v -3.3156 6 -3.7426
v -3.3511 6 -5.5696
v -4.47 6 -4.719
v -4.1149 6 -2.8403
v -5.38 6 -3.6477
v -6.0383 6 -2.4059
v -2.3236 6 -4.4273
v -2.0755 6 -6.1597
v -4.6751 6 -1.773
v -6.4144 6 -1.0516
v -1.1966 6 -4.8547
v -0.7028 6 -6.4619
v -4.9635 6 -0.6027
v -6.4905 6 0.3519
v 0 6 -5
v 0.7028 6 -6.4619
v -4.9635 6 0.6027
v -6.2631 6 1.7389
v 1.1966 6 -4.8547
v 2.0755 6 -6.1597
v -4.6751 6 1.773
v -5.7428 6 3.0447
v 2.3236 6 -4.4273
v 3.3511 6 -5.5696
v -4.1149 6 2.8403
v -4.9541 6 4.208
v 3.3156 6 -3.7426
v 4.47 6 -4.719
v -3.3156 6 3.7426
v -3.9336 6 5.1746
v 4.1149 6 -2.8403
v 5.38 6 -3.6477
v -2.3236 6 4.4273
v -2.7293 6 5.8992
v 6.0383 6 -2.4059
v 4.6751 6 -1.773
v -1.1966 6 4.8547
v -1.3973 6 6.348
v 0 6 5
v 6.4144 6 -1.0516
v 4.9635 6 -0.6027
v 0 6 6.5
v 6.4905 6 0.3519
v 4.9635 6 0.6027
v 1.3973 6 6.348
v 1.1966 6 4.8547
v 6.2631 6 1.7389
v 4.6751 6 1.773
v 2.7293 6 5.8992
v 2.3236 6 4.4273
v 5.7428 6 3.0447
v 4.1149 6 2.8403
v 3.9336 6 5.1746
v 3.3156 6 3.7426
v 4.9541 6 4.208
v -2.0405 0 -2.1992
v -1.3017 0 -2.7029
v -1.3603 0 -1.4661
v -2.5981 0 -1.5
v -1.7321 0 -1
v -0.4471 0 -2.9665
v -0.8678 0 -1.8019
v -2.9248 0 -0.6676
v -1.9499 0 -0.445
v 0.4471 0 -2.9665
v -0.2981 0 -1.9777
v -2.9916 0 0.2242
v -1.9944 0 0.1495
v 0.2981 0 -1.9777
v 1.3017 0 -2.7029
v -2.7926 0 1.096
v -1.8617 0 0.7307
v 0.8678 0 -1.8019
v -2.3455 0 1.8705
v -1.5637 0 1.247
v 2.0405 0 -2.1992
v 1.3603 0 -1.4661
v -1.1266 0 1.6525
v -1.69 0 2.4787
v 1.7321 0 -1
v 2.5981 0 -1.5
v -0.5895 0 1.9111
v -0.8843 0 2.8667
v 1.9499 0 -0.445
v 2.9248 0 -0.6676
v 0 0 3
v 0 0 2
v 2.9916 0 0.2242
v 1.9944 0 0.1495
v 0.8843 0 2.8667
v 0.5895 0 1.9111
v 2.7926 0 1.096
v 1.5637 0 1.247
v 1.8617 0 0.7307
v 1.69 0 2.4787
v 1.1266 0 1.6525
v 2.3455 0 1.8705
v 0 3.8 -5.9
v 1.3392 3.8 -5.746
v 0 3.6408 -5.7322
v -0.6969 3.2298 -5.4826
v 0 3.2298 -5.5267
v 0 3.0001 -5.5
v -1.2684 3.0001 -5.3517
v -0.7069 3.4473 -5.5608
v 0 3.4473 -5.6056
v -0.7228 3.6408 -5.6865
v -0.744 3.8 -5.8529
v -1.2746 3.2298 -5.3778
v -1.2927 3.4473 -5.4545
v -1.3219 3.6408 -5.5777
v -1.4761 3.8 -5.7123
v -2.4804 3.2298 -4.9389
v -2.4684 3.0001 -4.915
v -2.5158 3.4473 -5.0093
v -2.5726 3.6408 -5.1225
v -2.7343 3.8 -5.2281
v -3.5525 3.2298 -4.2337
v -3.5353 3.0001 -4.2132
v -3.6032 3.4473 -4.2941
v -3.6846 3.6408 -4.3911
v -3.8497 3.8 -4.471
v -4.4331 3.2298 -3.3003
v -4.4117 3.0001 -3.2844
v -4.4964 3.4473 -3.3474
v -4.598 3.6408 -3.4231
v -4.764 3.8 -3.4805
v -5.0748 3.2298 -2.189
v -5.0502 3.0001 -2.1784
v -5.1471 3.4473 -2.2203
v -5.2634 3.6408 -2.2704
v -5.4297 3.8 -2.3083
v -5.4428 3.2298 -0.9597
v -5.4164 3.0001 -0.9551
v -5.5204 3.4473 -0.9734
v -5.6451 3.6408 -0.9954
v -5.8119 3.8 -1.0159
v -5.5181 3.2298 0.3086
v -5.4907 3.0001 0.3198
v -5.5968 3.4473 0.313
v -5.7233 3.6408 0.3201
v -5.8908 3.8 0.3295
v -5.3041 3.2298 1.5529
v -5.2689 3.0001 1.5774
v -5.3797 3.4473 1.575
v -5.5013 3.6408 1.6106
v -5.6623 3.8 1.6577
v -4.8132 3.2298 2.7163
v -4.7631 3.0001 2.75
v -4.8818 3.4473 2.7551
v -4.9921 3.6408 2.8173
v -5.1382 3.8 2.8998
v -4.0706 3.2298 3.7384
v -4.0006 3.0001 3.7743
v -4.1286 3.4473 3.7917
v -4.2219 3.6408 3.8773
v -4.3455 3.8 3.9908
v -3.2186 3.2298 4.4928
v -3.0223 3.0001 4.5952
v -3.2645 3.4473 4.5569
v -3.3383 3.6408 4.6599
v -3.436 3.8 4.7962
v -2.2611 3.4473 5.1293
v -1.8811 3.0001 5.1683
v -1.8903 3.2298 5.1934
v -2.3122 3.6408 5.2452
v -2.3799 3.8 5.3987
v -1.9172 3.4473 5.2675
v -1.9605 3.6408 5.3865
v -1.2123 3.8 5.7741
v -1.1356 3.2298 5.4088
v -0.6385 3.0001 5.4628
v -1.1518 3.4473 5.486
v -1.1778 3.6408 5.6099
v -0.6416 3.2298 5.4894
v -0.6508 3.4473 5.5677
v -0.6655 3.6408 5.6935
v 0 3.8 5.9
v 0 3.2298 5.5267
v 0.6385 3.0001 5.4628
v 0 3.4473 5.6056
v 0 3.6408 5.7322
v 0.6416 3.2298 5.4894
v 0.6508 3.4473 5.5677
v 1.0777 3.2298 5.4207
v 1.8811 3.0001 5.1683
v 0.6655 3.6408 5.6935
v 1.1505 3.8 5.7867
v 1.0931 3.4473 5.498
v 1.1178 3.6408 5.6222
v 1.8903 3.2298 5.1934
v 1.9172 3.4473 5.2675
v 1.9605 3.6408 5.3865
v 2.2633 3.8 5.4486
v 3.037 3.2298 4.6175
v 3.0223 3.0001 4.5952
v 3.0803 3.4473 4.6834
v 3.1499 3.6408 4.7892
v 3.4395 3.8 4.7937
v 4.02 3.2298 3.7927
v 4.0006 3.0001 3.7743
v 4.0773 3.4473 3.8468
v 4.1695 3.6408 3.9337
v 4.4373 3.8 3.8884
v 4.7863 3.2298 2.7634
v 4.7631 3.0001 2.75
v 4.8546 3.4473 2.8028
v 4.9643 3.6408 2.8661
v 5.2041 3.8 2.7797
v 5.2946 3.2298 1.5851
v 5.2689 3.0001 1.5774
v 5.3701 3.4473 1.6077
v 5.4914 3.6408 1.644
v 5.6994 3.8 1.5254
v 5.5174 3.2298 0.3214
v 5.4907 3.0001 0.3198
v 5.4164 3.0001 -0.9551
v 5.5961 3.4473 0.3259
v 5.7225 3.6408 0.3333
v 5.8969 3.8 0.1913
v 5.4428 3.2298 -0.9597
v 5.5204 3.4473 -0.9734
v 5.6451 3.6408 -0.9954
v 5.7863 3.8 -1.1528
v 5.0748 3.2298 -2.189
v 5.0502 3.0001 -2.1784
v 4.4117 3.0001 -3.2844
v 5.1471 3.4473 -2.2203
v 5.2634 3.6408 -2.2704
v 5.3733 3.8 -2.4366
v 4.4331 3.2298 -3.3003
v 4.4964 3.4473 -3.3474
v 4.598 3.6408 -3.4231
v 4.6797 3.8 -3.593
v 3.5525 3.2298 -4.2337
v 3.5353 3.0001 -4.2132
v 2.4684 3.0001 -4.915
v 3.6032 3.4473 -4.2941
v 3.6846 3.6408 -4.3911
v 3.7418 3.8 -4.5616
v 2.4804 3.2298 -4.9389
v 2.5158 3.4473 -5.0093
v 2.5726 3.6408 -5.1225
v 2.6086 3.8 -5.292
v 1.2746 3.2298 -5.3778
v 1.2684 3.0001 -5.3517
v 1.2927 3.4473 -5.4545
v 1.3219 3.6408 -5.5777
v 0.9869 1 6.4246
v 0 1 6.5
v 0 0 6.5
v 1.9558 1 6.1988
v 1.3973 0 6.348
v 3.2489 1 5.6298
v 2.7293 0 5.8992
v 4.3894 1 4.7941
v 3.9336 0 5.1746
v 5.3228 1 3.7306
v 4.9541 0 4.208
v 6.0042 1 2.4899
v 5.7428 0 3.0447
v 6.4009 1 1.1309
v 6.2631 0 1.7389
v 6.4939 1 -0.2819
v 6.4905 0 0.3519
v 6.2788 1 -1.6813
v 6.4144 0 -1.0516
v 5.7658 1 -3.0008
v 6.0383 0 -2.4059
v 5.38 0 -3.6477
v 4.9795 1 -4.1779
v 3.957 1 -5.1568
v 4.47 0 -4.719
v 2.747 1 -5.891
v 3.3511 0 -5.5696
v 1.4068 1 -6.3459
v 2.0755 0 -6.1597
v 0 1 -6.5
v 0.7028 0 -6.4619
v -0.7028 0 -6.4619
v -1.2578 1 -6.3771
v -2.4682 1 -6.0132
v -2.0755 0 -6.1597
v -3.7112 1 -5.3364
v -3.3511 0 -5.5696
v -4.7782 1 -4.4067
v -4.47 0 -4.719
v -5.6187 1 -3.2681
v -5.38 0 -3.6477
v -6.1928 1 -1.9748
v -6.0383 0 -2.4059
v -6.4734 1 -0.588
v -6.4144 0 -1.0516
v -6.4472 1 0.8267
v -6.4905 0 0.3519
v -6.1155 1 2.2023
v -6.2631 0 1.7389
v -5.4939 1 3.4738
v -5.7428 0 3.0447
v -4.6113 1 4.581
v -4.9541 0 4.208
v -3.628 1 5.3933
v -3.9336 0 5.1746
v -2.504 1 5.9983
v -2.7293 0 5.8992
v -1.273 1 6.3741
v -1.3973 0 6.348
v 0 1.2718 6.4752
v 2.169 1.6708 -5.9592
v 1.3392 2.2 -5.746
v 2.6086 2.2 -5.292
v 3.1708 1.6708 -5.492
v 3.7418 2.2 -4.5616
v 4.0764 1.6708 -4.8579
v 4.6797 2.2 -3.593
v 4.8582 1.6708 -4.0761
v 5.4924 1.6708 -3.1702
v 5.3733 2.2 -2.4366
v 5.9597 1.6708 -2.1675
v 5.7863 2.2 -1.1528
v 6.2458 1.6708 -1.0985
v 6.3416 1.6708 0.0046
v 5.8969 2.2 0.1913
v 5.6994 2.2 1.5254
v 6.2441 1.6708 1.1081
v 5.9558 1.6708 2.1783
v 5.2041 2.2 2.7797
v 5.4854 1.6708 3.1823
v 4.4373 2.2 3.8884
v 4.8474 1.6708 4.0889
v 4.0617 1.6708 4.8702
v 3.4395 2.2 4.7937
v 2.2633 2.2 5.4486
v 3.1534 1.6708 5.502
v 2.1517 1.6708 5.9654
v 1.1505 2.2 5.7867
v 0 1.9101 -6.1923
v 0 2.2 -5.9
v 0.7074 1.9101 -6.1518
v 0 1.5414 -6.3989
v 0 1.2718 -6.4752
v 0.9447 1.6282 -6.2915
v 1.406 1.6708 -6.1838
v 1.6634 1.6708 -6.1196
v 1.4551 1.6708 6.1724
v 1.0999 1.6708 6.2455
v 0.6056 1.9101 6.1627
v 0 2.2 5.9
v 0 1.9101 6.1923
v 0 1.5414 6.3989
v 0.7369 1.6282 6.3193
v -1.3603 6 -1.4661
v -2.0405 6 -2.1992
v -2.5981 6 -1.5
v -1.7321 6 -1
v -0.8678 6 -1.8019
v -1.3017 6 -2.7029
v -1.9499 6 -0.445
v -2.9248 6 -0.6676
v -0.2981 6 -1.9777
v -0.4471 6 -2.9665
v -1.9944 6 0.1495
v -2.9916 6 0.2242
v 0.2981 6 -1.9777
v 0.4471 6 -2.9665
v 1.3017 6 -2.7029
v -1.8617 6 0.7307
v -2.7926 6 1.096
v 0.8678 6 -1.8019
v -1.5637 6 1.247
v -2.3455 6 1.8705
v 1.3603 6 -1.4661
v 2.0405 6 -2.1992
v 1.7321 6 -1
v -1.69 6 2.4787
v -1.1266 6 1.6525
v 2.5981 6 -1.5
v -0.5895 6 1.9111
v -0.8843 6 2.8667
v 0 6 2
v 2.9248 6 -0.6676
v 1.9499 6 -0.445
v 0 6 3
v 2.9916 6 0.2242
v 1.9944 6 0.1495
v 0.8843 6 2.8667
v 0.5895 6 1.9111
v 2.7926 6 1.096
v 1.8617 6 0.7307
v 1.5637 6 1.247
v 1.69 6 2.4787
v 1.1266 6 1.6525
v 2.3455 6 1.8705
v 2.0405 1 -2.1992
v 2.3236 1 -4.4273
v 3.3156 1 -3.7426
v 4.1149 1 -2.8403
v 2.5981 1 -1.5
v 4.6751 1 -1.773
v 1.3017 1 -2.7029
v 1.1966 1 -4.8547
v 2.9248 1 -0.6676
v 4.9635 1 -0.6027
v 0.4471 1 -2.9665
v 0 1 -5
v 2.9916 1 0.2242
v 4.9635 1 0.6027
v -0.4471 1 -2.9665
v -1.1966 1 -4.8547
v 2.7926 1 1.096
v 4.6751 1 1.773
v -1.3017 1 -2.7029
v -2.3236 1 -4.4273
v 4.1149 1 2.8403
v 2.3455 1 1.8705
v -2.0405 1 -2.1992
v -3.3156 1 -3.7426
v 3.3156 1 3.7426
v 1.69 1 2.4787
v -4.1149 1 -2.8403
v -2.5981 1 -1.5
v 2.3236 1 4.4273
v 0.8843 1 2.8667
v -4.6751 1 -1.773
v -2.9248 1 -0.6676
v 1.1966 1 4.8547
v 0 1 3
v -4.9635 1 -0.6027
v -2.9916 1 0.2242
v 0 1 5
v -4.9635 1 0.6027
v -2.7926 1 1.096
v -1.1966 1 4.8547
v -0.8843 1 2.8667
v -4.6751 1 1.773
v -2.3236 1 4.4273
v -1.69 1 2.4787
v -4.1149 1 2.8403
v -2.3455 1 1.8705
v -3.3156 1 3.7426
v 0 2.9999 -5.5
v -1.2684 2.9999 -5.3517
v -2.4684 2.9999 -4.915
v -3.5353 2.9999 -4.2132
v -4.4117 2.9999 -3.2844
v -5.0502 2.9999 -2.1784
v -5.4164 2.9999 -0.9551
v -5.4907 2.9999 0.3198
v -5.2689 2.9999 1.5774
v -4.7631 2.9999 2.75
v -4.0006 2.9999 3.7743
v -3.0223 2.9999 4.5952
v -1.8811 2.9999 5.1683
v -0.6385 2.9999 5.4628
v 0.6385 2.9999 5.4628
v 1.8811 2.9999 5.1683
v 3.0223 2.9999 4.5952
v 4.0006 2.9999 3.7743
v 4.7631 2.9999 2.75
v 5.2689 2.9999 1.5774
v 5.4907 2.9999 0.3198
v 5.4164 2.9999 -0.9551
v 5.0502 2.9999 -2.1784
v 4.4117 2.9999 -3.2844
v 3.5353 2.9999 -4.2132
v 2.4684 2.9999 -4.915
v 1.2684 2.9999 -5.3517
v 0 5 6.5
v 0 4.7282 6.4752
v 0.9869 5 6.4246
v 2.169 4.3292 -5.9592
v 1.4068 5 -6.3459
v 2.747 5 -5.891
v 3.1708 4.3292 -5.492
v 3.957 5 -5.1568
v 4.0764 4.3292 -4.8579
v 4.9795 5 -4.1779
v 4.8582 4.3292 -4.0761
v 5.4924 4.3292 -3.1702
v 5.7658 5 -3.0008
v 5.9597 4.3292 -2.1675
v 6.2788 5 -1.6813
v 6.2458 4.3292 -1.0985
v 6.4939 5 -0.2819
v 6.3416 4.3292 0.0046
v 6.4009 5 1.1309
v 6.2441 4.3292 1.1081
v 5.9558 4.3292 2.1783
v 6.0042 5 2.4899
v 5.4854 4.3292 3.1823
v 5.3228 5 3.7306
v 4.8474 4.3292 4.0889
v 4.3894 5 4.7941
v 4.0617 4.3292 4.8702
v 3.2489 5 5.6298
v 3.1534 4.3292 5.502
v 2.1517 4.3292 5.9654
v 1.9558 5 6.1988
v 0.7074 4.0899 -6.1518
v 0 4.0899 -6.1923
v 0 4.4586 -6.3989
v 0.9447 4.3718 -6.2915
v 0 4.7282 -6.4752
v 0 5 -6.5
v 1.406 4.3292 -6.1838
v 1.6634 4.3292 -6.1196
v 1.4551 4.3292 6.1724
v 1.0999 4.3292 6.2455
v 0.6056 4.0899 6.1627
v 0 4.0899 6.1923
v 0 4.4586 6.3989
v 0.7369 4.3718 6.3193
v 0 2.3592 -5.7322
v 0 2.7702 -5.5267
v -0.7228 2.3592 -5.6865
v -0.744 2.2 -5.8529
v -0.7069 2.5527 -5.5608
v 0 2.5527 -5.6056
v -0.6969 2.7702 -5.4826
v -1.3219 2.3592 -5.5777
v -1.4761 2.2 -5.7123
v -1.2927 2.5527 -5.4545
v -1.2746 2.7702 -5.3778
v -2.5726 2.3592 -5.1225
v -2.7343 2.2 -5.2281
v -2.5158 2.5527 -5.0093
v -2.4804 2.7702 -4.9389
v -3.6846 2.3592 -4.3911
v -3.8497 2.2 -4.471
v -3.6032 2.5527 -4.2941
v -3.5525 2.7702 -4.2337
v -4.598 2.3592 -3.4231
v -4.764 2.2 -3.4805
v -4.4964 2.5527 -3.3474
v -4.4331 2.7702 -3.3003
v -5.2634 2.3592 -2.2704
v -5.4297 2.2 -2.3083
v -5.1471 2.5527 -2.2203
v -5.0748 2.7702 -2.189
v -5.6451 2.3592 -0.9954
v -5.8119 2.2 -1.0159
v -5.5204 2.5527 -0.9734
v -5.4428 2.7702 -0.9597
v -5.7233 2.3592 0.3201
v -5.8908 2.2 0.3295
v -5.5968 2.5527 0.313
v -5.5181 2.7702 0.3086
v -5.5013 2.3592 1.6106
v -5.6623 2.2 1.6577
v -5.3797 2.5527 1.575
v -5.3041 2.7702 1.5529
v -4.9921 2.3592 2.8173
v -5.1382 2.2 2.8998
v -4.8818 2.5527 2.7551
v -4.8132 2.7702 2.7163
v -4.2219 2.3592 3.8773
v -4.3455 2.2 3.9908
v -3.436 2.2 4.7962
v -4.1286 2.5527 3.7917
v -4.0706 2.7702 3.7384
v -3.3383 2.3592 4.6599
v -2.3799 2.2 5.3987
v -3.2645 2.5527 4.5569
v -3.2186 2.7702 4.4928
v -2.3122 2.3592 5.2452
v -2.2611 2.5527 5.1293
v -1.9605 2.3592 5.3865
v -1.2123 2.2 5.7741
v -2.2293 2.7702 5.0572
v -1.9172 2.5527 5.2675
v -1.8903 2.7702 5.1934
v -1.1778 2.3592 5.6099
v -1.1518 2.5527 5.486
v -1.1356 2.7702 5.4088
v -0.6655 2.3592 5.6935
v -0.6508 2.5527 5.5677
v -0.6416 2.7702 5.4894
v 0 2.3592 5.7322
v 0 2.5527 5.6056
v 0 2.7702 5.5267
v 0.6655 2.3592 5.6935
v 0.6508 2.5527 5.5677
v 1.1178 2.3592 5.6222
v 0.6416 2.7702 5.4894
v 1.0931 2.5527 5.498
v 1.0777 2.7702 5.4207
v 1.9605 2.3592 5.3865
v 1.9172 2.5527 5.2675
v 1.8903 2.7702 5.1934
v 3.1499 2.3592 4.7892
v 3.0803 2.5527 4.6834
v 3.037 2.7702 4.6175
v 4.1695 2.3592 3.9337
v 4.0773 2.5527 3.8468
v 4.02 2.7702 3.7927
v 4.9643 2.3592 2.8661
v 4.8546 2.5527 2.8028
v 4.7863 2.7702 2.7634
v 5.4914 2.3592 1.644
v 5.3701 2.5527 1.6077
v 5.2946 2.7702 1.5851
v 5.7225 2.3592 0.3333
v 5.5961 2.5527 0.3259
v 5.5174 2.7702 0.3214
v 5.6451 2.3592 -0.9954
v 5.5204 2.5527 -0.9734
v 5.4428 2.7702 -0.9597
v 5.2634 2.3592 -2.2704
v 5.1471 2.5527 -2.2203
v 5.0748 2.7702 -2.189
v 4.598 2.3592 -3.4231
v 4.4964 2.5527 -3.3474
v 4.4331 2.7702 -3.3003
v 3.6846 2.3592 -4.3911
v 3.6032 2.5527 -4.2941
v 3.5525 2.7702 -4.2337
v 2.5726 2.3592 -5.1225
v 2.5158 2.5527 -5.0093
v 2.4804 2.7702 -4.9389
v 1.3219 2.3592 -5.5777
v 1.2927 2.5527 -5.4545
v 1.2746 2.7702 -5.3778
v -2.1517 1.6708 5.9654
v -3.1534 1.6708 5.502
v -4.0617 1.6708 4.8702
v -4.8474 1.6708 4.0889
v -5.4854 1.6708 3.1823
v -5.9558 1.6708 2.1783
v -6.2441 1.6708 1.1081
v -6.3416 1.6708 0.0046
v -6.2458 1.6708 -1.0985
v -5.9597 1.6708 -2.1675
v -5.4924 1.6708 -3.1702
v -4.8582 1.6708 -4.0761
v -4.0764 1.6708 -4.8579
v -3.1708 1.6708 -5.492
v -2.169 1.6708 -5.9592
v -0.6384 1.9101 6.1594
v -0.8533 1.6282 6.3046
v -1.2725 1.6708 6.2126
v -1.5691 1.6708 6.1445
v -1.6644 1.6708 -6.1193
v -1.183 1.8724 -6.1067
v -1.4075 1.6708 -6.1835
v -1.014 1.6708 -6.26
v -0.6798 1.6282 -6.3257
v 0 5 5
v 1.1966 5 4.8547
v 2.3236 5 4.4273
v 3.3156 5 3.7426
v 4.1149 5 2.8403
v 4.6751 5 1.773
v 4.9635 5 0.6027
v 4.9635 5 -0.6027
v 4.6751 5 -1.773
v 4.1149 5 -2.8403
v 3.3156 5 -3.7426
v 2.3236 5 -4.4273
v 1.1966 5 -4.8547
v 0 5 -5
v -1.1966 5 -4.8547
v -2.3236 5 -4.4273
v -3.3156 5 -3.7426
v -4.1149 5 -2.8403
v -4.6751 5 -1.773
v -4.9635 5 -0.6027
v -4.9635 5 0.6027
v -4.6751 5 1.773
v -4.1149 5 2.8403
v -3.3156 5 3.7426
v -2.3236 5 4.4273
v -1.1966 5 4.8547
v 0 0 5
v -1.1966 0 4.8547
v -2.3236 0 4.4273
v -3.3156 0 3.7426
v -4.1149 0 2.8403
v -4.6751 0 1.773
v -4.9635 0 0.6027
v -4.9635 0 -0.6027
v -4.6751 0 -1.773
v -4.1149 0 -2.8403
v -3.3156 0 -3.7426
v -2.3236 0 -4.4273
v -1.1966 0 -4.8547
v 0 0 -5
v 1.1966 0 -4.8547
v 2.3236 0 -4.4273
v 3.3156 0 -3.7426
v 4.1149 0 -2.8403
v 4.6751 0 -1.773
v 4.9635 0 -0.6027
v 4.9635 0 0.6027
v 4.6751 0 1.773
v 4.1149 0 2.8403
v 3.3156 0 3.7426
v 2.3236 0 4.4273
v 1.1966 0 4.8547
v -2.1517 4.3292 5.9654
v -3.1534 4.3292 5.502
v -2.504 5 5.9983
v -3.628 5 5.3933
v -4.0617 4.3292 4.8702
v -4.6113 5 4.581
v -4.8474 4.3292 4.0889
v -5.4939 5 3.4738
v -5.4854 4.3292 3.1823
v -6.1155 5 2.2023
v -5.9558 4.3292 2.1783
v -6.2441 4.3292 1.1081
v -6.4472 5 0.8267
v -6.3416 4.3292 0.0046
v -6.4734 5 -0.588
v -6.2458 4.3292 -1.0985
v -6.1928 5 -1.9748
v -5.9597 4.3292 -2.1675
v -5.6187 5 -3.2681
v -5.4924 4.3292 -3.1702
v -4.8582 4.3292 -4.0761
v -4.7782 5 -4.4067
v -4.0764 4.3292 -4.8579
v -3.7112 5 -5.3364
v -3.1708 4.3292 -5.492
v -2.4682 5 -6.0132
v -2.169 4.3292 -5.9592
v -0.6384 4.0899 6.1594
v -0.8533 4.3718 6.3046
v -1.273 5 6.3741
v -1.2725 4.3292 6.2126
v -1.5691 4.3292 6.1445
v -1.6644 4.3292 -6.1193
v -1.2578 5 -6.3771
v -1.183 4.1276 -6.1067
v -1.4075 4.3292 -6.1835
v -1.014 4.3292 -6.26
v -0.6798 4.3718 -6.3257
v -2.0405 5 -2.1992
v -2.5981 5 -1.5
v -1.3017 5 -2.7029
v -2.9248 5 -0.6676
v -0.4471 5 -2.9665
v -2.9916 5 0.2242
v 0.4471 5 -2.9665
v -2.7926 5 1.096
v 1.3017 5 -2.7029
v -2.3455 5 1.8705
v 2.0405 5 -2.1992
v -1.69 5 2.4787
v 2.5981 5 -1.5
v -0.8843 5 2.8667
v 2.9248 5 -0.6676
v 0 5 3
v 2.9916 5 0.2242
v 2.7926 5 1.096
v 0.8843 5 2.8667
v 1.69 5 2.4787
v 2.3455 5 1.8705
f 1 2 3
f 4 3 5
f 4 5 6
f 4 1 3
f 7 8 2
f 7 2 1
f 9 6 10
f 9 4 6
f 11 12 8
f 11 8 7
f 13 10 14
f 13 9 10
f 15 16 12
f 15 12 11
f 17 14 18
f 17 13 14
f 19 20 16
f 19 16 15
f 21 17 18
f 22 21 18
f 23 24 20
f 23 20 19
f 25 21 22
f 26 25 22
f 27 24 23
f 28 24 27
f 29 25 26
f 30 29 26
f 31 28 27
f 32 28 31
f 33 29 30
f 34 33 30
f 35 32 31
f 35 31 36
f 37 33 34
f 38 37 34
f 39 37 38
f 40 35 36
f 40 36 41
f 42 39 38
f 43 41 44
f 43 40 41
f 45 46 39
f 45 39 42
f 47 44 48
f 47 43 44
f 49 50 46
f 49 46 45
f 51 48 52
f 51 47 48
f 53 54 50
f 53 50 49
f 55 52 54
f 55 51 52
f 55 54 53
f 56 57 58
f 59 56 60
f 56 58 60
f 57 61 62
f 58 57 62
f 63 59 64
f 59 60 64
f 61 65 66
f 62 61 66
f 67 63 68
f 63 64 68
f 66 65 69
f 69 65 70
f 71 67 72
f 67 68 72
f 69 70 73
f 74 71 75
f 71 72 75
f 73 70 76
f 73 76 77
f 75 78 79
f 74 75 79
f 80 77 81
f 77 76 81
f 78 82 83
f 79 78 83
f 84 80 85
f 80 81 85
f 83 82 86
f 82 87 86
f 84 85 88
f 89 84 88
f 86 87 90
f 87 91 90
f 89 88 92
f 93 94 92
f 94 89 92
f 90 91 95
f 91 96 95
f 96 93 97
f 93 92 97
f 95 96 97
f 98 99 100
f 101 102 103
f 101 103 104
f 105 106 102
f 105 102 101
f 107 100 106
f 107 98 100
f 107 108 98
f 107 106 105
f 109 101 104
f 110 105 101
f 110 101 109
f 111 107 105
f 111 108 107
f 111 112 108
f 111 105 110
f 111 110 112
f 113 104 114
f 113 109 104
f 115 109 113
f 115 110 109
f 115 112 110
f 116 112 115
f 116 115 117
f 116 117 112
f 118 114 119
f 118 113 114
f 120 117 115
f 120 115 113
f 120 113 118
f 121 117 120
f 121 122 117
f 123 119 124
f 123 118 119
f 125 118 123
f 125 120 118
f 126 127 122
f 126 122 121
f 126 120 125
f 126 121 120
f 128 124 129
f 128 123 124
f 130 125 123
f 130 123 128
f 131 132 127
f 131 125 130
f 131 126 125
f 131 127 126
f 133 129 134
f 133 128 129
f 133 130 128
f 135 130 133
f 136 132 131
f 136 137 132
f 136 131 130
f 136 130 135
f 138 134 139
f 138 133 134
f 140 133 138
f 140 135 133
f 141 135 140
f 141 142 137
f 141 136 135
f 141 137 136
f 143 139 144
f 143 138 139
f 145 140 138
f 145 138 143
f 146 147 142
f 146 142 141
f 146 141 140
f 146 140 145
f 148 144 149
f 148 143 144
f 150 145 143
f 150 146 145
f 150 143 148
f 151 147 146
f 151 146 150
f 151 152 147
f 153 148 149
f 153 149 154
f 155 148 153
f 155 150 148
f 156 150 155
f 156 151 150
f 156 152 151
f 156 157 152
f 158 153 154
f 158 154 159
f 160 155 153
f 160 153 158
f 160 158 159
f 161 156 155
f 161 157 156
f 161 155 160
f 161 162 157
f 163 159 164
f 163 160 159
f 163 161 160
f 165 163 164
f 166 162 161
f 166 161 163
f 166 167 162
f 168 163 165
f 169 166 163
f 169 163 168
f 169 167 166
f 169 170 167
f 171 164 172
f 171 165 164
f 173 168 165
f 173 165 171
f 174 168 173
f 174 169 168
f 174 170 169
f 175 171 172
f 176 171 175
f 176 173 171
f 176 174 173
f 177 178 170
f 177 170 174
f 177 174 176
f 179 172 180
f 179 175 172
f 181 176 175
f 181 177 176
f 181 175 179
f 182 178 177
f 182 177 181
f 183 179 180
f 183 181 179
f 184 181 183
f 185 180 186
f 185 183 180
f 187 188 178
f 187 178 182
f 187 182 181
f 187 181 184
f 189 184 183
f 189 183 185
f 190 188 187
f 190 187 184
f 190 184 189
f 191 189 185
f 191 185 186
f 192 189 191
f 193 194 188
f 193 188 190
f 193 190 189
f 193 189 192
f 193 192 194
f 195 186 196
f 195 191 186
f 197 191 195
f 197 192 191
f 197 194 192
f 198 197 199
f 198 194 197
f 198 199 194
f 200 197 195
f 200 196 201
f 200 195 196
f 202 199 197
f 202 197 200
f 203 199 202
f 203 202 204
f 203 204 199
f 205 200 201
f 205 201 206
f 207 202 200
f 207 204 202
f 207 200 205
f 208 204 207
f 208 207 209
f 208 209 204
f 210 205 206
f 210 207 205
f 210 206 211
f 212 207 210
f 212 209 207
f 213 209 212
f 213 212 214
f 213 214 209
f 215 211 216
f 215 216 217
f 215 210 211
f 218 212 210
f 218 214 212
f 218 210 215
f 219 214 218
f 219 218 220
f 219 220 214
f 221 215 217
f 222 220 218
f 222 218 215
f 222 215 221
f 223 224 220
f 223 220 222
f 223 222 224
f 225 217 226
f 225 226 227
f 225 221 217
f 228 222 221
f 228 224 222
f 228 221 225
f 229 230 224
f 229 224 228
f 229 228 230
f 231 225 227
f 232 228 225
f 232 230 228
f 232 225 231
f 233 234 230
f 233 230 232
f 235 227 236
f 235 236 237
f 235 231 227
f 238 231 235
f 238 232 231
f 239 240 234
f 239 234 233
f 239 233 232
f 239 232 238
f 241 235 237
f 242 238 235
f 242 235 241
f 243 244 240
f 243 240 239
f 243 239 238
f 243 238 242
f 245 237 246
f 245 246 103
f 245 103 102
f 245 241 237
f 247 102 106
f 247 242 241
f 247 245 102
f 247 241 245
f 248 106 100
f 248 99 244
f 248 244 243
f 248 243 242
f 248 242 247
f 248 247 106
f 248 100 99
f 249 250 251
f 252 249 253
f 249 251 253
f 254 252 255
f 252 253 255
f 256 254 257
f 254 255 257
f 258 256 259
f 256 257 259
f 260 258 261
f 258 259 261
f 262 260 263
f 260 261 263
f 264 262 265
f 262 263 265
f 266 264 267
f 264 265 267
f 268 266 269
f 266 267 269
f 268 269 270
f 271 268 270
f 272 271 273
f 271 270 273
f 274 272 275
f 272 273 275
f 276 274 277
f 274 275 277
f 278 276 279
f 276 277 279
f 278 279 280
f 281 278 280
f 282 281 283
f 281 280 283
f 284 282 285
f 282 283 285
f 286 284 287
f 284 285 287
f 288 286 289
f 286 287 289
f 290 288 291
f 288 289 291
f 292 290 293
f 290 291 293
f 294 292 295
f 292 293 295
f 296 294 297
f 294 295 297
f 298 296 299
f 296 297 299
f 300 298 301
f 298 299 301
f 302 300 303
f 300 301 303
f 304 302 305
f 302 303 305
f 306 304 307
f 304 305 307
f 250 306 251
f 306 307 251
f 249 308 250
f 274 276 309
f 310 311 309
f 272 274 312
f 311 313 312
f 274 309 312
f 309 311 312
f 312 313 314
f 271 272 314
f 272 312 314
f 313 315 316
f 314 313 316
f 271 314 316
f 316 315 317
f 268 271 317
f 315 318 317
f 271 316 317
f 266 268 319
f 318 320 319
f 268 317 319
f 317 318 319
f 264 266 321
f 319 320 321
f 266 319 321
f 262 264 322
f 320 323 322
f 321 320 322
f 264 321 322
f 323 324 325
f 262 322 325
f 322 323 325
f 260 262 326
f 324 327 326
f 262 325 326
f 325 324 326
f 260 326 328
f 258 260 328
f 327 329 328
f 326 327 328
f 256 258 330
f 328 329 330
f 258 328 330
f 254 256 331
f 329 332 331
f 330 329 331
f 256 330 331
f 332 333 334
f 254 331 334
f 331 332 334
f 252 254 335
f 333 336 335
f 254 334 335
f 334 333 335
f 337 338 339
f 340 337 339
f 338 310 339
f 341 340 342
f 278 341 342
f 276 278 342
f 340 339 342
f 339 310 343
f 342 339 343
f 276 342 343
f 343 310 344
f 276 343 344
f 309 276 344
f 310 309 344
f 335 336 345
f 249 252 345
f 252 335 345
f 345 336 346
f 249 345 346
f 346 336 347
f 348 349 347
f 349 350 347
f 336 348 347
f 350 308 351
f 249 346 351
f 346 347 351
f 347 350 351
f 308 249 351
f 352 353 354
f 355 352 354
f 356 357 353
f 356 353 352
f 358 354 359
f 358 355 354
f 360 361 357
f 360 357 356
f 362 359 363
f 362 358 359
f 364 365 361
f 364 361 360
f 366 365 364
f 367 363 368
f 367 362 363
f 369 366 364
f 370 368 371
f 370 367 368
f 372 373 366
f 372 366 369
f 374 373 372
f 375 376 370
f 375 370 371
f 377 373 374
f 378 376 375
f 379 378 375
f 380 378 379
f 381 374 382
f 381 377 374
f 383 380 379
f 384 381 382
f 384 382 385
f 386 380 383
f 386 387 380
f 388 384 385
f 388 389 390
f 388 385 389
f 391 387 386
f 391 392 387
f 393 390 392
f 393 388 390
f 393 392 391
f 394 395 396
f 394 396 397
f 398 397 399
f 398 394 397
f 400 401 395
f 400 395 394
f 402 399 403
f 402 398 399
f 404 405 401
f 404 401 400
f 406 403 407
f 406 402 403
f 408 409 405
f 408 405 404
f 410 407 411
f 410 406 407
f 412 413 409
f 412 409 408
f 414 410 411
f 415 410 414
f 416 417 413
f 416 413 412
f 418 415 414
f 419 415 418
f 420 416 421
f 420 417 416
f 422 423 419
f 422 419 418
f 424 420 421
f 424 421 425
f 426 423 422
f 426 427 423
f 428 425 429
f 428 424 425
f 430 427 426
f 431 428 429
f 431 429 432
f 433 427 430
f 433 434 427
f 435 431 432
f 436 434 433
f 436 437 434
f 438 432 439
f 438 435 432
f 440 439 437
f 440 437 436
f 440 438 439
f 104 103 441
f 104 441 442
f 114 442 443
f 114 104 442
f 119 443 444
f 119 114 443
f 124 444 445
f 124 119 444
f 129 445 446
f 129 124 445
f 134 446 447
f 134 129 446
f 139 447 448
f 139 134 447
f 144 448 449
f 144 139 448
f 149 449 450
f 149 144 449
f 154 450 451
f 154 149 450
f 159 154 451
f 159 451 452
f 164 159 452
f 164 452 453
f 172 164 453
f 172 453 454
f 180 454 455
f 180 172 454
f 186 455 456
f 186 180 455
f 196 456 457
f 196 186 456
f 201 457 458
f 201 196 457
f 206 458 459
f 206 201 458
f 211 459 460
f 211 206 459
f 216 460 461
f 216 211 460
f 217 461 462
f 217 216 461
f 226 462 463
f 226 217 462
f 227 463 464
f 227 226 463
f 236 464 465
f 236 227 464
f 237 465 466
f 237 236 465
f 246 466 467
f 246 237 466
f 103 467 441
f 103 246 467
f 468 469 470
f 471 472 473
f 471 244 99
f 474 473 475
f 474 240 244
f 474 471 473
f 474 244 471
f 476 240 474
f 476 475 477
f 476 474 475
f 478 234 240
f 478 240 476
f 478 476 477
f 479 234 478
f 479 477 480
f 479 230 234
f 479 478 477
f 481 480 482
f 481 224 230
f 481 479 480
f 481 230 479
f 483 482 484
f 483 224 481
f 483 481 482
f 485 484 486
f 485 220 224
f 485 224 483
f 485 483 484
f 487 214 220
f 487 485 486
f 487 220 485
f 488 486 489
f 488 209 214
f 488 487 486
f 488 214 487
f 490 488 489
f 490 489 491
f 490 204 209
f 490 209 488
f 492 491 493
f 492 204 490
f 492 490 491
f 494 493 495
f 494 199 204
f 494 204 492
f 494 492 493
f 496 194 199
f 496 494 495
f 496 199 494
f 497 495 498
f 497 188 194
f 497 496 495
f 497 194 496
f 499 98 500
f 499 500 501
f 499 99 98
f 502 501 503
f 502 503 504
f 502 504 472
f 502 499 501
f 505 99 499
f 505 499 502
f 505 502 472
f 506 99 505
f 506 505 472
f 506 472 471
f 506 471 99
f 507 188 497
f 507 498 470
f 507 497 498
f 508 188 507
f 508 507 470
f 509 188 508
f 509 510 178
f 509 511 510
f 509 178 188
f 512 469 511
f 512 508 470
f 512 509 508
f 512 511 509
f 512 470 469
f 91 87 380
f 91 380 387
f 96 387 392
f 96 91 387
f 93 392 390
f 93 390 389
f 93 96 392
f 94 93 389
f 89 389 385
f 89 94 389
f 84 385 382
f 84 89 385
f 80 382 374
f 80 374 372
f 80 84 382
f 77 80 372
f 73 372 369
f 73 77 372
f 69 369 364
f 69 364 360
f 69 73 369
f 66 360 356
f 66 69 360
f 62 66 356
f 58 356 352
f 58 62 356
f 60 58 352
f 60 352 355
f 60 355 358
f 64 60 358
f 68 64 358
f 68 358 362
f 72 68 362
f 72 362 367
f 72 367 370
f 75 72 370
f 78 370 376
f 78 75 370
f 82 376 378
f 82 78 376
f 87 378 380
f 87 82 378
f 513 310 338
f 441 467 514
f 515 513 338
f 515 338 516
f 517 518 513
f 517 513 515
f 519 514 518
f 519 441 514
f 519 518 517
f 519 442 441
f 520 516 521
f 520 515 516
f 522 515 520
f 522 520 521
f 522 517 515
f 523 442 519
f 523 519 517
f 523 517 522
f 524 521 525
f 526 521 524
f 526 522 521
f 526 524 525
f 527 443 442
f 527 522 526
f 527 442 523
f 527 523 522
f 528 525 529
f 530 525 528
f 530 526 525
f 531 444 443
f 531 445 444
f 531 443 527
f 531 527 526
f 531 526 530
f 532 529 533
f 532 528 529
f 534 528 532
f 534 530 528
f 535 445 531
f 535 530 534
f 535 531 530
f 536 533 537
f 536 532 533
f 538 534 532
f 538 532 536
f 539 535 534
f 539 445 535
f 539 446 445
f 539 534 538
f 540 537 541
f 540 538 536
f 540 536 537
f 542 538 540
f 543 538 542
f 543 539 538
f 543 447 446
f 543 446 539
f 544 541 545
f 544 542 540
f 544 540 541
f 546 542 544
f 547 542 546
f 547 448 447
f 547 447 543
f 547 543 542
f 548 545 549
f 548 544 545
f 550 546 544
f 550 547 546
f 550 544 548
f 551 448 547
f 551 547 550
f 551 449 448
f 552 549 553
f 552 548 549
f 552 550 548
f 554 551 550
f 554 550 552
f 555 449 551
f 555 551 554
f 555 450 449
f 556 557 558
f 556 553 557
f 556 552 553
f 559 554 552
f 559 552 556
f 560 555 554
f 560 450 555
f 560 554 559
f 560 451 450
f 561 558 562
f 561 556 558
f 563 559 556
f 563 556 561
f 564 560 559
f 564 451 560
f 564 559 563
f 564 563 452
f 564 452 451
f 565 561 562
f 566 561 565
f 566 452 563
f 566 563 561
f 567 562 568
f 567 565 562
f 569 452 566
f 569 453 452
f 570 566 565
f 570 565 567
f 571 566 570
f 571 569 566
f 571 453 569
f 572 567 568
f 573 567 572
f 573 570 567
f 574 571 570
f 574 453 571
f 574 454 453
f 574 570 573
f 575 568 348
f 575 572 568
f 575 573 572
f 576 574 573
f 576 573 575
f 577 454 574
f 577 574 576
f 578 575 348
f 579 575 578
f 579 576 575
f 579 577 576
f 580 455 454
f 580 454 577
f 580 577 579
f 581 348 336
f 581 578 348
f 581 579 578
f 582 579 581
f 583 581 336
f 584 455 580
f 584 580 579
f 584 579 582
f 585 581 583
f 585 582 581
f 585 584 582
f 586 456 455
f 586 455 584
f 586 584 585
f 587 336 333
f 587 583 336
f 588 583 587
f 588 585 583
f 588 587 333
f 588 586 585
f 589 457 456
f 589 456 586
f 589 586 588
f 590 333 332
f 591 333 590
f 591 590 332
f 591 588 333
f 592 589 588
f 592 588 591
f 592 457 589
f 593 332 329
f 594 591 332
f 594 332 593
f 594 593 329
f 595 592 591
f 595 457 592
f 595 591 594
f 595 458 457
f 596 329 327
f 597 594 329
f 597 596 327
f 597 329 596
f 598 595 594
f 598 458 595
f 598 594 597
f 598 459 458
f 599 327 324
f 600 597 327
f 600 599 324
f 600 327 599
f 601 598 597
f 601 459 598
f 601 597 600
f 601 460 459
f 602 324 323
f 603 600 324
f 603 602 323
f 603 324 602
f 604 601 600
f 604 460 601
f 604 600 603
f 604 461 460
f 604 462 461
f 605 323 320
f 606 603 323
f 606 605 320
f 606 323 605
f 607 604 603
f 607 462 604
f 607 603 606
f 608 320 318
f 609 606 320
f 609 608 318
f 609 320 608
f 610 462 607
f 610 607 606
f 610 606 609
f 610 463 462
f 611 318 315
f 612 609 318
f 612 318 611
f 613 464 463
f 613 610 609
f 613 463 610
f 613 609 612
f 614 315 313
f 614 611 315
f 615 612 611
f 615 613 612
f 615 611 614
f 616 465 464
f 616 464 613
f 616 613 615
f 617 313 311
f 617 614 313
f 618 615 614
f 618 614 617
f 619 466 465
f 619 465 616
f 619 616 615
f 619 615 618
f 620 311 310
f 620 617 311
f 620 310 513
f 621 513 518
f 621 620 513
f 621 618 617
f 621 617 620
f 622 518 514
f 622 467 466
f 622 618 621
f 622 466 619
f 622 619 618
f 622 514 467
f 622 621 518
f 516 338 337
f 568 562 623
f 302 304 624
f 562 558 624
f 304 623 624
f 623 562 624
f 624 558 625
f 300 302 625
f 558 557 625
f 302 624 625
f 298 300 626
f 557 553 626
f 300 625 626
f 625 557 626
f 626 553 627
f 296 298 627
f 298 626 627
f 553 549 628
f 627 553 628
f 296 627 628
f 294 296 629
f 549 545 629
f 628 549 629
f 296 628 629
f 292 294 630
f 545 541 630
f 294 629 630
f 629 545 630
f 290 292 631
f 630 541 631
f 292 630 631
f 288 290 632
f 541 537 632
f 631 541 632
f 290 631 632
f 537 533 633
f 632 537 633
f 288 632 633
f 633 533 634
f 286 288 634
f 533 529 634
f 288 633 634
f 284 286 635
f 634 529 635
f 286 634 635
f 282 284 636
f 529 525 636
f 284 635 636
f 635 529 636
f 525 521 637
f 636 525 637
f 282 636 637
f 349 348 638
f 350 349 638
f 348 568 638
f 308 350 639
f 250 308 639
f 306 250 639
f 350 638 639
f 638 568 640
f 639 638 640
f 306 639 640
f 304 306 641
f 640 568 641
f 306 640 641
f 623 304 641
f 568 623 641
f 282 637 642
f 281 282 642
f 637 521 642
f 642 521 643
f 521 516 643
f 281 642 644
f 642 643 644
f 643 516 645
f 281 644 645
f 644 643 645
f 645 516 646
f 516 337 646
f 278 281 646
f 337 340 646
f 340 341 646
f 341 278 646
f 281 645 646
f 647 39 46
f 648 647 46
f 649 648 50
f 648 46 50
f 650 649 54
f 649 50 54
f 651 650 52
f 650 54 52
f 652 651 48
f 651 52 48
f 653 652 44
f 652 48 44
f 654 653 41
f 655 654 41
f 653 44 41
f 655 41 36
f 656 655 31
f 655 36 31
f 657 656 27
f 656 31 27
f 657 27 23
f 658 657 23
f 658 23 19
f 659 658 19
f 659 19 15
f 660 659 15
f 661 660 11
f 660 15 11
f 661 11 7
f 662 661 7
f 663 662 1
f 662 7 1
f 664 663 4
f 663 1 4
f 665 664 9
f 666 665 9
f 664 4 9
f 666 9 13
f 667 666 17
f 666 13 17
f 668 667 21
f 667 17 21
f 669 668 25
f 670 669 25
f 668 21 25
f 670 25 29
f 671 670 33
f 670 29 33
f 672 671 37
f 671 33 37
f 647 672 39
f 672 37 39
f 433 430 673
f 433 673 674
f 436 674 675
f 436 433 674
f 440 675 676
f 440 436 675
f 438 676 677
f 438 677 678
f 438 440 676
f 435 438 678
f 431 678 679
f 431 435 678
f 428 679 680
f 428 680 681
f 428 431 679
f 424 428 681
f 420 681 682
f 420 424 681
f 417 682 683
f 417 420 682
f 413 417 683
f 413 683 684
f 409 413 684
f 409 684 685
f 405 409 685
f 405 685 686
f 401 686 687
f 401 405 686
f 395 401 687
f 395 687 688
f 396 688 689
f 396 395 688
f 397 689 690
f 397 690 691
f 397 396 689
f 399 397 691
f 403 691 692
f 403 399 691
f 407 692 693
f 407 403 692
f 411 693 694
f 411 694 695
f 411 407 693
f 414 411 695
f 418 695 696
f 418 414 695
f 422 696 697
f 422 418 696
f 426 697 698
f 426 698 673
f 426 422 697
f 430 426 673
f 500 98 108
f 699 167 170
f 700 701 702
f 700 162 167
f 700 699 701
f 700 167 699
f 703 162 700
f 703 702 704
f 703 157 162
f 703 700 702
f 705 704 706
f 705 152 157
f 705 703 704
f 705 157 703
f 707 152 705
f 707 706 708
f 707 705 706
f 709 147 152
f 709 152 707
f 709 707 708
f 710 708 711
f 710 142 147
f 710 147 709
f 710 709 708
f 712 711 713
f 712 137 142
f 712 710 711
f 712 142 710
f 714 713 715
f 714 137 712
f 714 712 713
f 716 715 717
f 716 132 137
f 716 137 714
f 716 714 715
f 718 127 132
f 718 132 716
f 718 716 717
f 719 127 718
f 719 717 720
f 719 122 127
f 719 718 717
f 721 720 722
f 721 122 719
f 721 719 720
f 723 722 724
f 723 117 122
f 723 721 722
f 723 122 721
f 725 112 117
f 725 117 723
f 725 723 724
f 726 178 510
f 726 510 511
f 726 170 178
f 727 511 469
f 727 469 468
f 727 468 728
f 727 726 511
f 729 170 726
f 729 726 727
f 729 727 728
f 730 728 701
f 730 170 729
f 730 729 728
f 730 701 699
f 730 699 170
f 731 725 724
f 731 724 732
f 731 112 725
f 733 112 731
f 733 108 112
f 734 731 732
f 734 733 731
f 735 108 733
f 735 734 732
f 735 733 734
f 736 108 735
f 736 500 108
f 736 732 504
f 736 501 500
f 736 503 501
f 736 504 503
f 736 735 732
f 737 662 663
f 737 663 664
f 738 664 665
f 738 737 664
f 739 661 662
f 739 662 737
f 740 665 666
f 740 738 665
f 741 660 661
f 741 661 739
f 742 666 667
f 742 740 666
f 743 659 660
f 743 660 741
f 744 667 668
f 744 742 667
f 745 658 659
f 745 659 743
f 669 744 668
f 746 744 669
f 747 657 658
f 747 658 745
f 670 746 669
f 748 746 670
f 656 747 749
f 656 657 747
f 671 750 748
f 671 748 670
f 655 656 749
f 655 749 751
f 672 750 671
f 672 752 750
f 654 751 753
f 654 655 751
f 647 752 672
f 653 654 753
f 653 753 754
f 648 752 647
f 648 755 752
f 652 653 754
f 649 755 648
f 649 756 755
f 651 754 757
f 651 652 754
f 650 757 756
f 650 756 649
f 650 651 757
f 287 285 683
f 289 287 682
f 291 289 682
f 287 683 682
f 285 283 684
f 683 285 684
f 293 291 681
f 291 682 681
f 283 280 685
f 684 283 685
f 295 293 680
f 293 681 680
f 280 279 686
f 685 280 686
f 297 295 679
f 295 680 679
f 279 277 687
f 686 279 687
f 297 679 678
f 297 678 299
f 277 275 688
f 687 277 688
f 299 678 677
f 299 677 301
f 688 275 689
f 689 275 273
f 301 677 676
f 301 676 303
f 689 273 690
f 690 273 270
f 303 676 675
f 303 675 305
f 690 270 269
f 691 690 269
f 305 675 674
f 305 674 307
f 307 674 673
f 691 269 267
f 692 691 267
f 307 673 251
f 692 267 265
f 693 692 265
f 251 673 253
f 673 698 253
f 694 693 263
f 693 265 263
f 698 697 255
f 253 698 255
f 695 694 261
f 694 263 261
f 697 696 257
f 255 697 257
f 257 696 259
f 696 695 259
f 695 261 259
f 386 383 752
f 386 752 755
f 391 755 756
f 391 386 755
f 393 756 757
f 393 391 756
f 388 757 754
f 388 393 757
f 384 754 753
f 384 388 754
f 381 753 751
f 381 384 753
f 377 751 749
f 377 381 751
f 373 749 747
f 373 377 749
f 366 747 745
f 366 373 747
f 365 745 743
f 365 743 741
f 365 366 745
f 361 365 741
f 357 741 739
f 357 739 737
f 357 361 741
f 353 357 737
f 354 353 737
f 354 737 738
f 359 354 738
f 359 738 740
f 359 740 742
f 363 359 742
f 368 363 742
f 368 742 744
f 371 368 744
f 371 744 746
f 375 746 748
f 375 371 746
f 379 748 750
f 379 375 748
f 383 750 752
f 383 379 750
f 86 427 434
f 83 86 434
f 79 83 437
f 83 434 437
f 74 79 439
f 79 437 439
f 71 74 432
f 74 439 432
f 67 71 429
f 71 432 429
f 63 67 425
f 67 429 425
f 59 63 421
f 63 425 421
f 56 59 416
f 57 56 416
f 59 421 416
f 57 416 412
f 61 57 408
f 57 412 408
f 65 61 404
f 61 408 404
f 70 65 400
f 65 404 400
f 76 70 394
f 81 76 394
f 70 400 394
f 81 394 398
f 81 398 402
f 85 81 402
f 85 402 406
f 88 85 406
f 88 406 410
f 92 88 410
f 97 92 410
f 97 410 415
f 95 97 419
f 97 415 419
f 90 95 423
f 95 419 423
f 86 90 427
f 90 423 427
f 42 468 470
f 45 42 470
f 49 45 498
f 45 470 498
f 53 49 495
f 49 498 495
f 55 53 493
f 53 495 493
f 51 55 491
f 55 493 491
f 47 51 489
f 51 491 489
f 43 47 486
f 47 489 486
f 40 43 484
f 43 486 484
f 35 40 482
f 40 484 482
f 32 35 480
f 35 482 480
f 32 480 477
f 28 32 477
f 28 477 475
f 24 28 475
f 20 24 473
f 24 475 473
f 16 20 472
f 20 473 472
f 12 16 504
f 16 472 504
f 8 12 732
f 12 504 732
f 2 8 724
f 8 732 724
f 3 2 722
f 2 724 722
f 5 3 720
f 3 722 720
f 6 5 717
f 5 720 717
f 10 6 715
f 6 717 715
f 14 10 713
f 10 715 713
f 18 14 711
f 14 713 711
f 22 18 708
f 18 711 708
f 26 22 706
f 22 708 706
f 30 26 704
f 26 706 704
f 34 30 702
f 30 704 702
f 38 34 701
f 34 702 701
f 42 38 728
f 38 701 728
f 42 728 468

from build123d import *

# Parameters (mm, degrees)
SKETCH_1_R          = 6.5
SKETCH_1_R_2        = 2
EXTRUDE_1_DEPTH     = 6
SKETCH_2_R          = 5
SKETCH_2_R_2        = 3
CUT_EXTRUDE_1_DEPTH = 1
CUT_EXTRUDE_START   = -1
SKETCH_3_R          = 5
SKETCH_3_R_2        = 3
CUT_EXTRUDE_2_DEPTH = 1
SKETCH_4_W          = 1
SKETCH_4_H          = 2
FILLET_1_R          = 1
FILLET_2_R          = 1.5


with BuildPart() as part:
    # 草图1 → 凸台-拉伸1 (new body)
    with BuildSketch(Plane(origin=(0, 0, 0), x_dir=(1, 0, 0), z_dir=(0, 1, 0))):
        with Locations(Location((0, 0, 0), (0, 0, 270))):
            Circle(SKETCH_1_R)
        with Locations(Location((0, 0, 0), (0, 0, 270))):
            Circle(SKETCH_1_R_2, mode=Mode.SUBTRACT)
    extrude(amount=EXTRUDE_1_DEPTH)

    # 草图2 → 切除-拉伸1 (cut)
    with BuildSketch(Plane(origin=(0, 6, 0), x_dir=(1, 0, 0), z_dir=(0, 1, 0))):
        with Locations(Location((0, 0, 0), (0, 0, 270))):
            Circle(SKETCH_2_R)
        with Locations(Location((0, 0, 0), (0, 0, 270))):
            Circle(SKETCH_2_R_2, mode=Mode.SUBTRACT)
    extrude(amount=-CUT_EXTRUDE_1_DEPTH, mode=Mode.SUBTRACT)

    # 草图3 → 切除-拉伸2 (cut)
    with BuildSketch(Plane(origin=(0, 0, 0), x_dir=(-1, 0, 0), z_dir=(0, -1, 0)).offset(CUT_EXTRUDE_START)):
        with Locations(Location((0, 0, 0), (0, 0, 270))):
            Circle(SKETCH_3_R)
        with Locations(Location((0, 0, 0), (0, 0, 270))):
            Circle(SKETCH_3_R_2, mode=Mode.SUBTRACT)
    extrude(amount=CUT_EXTRUDE_2_DEPTH, mode=Mode.SUBTRACT)

    # 草图4 → 切除-旋转1 (revolve, cut)
    with BuildSketch(Plane.XY, mode=Mode.PRIVATE) as cut_revolve_1_sk:
        with Locations((6, 3)):
            Rectangle(SKETCH_4_W, SKETCH_4_H)
    revolve(cut_revolve_1_sk.sketch.rotate(Axis((0, 0, 0), (0, 1, 0)), 90), axis=Axis((0, 0, 0), (0, 1, 0)), mode=Mode.SUBTRACT)

    # 圆角1
    fillet_1_edges = [part.edges().sort_by_distance(p)[0] for p in [
        (0, 2, 5.5),
        (0, 4, 5.5),
    ]]
    fillet(fillet_1_edges, radius=FILLET_1_R - 0.0001)  # a hair under: the kernel refuses the full size

    # 圆角2
    fillet_2_edges = [part.edges().sort_by_distance(p)[0] for p in [
        (0, 4, -6.5),
        (0, 2, -6.5),
    ]]
    fillet(fillet_2_edges, radius=FILLET_2_R)


solid = part.part
